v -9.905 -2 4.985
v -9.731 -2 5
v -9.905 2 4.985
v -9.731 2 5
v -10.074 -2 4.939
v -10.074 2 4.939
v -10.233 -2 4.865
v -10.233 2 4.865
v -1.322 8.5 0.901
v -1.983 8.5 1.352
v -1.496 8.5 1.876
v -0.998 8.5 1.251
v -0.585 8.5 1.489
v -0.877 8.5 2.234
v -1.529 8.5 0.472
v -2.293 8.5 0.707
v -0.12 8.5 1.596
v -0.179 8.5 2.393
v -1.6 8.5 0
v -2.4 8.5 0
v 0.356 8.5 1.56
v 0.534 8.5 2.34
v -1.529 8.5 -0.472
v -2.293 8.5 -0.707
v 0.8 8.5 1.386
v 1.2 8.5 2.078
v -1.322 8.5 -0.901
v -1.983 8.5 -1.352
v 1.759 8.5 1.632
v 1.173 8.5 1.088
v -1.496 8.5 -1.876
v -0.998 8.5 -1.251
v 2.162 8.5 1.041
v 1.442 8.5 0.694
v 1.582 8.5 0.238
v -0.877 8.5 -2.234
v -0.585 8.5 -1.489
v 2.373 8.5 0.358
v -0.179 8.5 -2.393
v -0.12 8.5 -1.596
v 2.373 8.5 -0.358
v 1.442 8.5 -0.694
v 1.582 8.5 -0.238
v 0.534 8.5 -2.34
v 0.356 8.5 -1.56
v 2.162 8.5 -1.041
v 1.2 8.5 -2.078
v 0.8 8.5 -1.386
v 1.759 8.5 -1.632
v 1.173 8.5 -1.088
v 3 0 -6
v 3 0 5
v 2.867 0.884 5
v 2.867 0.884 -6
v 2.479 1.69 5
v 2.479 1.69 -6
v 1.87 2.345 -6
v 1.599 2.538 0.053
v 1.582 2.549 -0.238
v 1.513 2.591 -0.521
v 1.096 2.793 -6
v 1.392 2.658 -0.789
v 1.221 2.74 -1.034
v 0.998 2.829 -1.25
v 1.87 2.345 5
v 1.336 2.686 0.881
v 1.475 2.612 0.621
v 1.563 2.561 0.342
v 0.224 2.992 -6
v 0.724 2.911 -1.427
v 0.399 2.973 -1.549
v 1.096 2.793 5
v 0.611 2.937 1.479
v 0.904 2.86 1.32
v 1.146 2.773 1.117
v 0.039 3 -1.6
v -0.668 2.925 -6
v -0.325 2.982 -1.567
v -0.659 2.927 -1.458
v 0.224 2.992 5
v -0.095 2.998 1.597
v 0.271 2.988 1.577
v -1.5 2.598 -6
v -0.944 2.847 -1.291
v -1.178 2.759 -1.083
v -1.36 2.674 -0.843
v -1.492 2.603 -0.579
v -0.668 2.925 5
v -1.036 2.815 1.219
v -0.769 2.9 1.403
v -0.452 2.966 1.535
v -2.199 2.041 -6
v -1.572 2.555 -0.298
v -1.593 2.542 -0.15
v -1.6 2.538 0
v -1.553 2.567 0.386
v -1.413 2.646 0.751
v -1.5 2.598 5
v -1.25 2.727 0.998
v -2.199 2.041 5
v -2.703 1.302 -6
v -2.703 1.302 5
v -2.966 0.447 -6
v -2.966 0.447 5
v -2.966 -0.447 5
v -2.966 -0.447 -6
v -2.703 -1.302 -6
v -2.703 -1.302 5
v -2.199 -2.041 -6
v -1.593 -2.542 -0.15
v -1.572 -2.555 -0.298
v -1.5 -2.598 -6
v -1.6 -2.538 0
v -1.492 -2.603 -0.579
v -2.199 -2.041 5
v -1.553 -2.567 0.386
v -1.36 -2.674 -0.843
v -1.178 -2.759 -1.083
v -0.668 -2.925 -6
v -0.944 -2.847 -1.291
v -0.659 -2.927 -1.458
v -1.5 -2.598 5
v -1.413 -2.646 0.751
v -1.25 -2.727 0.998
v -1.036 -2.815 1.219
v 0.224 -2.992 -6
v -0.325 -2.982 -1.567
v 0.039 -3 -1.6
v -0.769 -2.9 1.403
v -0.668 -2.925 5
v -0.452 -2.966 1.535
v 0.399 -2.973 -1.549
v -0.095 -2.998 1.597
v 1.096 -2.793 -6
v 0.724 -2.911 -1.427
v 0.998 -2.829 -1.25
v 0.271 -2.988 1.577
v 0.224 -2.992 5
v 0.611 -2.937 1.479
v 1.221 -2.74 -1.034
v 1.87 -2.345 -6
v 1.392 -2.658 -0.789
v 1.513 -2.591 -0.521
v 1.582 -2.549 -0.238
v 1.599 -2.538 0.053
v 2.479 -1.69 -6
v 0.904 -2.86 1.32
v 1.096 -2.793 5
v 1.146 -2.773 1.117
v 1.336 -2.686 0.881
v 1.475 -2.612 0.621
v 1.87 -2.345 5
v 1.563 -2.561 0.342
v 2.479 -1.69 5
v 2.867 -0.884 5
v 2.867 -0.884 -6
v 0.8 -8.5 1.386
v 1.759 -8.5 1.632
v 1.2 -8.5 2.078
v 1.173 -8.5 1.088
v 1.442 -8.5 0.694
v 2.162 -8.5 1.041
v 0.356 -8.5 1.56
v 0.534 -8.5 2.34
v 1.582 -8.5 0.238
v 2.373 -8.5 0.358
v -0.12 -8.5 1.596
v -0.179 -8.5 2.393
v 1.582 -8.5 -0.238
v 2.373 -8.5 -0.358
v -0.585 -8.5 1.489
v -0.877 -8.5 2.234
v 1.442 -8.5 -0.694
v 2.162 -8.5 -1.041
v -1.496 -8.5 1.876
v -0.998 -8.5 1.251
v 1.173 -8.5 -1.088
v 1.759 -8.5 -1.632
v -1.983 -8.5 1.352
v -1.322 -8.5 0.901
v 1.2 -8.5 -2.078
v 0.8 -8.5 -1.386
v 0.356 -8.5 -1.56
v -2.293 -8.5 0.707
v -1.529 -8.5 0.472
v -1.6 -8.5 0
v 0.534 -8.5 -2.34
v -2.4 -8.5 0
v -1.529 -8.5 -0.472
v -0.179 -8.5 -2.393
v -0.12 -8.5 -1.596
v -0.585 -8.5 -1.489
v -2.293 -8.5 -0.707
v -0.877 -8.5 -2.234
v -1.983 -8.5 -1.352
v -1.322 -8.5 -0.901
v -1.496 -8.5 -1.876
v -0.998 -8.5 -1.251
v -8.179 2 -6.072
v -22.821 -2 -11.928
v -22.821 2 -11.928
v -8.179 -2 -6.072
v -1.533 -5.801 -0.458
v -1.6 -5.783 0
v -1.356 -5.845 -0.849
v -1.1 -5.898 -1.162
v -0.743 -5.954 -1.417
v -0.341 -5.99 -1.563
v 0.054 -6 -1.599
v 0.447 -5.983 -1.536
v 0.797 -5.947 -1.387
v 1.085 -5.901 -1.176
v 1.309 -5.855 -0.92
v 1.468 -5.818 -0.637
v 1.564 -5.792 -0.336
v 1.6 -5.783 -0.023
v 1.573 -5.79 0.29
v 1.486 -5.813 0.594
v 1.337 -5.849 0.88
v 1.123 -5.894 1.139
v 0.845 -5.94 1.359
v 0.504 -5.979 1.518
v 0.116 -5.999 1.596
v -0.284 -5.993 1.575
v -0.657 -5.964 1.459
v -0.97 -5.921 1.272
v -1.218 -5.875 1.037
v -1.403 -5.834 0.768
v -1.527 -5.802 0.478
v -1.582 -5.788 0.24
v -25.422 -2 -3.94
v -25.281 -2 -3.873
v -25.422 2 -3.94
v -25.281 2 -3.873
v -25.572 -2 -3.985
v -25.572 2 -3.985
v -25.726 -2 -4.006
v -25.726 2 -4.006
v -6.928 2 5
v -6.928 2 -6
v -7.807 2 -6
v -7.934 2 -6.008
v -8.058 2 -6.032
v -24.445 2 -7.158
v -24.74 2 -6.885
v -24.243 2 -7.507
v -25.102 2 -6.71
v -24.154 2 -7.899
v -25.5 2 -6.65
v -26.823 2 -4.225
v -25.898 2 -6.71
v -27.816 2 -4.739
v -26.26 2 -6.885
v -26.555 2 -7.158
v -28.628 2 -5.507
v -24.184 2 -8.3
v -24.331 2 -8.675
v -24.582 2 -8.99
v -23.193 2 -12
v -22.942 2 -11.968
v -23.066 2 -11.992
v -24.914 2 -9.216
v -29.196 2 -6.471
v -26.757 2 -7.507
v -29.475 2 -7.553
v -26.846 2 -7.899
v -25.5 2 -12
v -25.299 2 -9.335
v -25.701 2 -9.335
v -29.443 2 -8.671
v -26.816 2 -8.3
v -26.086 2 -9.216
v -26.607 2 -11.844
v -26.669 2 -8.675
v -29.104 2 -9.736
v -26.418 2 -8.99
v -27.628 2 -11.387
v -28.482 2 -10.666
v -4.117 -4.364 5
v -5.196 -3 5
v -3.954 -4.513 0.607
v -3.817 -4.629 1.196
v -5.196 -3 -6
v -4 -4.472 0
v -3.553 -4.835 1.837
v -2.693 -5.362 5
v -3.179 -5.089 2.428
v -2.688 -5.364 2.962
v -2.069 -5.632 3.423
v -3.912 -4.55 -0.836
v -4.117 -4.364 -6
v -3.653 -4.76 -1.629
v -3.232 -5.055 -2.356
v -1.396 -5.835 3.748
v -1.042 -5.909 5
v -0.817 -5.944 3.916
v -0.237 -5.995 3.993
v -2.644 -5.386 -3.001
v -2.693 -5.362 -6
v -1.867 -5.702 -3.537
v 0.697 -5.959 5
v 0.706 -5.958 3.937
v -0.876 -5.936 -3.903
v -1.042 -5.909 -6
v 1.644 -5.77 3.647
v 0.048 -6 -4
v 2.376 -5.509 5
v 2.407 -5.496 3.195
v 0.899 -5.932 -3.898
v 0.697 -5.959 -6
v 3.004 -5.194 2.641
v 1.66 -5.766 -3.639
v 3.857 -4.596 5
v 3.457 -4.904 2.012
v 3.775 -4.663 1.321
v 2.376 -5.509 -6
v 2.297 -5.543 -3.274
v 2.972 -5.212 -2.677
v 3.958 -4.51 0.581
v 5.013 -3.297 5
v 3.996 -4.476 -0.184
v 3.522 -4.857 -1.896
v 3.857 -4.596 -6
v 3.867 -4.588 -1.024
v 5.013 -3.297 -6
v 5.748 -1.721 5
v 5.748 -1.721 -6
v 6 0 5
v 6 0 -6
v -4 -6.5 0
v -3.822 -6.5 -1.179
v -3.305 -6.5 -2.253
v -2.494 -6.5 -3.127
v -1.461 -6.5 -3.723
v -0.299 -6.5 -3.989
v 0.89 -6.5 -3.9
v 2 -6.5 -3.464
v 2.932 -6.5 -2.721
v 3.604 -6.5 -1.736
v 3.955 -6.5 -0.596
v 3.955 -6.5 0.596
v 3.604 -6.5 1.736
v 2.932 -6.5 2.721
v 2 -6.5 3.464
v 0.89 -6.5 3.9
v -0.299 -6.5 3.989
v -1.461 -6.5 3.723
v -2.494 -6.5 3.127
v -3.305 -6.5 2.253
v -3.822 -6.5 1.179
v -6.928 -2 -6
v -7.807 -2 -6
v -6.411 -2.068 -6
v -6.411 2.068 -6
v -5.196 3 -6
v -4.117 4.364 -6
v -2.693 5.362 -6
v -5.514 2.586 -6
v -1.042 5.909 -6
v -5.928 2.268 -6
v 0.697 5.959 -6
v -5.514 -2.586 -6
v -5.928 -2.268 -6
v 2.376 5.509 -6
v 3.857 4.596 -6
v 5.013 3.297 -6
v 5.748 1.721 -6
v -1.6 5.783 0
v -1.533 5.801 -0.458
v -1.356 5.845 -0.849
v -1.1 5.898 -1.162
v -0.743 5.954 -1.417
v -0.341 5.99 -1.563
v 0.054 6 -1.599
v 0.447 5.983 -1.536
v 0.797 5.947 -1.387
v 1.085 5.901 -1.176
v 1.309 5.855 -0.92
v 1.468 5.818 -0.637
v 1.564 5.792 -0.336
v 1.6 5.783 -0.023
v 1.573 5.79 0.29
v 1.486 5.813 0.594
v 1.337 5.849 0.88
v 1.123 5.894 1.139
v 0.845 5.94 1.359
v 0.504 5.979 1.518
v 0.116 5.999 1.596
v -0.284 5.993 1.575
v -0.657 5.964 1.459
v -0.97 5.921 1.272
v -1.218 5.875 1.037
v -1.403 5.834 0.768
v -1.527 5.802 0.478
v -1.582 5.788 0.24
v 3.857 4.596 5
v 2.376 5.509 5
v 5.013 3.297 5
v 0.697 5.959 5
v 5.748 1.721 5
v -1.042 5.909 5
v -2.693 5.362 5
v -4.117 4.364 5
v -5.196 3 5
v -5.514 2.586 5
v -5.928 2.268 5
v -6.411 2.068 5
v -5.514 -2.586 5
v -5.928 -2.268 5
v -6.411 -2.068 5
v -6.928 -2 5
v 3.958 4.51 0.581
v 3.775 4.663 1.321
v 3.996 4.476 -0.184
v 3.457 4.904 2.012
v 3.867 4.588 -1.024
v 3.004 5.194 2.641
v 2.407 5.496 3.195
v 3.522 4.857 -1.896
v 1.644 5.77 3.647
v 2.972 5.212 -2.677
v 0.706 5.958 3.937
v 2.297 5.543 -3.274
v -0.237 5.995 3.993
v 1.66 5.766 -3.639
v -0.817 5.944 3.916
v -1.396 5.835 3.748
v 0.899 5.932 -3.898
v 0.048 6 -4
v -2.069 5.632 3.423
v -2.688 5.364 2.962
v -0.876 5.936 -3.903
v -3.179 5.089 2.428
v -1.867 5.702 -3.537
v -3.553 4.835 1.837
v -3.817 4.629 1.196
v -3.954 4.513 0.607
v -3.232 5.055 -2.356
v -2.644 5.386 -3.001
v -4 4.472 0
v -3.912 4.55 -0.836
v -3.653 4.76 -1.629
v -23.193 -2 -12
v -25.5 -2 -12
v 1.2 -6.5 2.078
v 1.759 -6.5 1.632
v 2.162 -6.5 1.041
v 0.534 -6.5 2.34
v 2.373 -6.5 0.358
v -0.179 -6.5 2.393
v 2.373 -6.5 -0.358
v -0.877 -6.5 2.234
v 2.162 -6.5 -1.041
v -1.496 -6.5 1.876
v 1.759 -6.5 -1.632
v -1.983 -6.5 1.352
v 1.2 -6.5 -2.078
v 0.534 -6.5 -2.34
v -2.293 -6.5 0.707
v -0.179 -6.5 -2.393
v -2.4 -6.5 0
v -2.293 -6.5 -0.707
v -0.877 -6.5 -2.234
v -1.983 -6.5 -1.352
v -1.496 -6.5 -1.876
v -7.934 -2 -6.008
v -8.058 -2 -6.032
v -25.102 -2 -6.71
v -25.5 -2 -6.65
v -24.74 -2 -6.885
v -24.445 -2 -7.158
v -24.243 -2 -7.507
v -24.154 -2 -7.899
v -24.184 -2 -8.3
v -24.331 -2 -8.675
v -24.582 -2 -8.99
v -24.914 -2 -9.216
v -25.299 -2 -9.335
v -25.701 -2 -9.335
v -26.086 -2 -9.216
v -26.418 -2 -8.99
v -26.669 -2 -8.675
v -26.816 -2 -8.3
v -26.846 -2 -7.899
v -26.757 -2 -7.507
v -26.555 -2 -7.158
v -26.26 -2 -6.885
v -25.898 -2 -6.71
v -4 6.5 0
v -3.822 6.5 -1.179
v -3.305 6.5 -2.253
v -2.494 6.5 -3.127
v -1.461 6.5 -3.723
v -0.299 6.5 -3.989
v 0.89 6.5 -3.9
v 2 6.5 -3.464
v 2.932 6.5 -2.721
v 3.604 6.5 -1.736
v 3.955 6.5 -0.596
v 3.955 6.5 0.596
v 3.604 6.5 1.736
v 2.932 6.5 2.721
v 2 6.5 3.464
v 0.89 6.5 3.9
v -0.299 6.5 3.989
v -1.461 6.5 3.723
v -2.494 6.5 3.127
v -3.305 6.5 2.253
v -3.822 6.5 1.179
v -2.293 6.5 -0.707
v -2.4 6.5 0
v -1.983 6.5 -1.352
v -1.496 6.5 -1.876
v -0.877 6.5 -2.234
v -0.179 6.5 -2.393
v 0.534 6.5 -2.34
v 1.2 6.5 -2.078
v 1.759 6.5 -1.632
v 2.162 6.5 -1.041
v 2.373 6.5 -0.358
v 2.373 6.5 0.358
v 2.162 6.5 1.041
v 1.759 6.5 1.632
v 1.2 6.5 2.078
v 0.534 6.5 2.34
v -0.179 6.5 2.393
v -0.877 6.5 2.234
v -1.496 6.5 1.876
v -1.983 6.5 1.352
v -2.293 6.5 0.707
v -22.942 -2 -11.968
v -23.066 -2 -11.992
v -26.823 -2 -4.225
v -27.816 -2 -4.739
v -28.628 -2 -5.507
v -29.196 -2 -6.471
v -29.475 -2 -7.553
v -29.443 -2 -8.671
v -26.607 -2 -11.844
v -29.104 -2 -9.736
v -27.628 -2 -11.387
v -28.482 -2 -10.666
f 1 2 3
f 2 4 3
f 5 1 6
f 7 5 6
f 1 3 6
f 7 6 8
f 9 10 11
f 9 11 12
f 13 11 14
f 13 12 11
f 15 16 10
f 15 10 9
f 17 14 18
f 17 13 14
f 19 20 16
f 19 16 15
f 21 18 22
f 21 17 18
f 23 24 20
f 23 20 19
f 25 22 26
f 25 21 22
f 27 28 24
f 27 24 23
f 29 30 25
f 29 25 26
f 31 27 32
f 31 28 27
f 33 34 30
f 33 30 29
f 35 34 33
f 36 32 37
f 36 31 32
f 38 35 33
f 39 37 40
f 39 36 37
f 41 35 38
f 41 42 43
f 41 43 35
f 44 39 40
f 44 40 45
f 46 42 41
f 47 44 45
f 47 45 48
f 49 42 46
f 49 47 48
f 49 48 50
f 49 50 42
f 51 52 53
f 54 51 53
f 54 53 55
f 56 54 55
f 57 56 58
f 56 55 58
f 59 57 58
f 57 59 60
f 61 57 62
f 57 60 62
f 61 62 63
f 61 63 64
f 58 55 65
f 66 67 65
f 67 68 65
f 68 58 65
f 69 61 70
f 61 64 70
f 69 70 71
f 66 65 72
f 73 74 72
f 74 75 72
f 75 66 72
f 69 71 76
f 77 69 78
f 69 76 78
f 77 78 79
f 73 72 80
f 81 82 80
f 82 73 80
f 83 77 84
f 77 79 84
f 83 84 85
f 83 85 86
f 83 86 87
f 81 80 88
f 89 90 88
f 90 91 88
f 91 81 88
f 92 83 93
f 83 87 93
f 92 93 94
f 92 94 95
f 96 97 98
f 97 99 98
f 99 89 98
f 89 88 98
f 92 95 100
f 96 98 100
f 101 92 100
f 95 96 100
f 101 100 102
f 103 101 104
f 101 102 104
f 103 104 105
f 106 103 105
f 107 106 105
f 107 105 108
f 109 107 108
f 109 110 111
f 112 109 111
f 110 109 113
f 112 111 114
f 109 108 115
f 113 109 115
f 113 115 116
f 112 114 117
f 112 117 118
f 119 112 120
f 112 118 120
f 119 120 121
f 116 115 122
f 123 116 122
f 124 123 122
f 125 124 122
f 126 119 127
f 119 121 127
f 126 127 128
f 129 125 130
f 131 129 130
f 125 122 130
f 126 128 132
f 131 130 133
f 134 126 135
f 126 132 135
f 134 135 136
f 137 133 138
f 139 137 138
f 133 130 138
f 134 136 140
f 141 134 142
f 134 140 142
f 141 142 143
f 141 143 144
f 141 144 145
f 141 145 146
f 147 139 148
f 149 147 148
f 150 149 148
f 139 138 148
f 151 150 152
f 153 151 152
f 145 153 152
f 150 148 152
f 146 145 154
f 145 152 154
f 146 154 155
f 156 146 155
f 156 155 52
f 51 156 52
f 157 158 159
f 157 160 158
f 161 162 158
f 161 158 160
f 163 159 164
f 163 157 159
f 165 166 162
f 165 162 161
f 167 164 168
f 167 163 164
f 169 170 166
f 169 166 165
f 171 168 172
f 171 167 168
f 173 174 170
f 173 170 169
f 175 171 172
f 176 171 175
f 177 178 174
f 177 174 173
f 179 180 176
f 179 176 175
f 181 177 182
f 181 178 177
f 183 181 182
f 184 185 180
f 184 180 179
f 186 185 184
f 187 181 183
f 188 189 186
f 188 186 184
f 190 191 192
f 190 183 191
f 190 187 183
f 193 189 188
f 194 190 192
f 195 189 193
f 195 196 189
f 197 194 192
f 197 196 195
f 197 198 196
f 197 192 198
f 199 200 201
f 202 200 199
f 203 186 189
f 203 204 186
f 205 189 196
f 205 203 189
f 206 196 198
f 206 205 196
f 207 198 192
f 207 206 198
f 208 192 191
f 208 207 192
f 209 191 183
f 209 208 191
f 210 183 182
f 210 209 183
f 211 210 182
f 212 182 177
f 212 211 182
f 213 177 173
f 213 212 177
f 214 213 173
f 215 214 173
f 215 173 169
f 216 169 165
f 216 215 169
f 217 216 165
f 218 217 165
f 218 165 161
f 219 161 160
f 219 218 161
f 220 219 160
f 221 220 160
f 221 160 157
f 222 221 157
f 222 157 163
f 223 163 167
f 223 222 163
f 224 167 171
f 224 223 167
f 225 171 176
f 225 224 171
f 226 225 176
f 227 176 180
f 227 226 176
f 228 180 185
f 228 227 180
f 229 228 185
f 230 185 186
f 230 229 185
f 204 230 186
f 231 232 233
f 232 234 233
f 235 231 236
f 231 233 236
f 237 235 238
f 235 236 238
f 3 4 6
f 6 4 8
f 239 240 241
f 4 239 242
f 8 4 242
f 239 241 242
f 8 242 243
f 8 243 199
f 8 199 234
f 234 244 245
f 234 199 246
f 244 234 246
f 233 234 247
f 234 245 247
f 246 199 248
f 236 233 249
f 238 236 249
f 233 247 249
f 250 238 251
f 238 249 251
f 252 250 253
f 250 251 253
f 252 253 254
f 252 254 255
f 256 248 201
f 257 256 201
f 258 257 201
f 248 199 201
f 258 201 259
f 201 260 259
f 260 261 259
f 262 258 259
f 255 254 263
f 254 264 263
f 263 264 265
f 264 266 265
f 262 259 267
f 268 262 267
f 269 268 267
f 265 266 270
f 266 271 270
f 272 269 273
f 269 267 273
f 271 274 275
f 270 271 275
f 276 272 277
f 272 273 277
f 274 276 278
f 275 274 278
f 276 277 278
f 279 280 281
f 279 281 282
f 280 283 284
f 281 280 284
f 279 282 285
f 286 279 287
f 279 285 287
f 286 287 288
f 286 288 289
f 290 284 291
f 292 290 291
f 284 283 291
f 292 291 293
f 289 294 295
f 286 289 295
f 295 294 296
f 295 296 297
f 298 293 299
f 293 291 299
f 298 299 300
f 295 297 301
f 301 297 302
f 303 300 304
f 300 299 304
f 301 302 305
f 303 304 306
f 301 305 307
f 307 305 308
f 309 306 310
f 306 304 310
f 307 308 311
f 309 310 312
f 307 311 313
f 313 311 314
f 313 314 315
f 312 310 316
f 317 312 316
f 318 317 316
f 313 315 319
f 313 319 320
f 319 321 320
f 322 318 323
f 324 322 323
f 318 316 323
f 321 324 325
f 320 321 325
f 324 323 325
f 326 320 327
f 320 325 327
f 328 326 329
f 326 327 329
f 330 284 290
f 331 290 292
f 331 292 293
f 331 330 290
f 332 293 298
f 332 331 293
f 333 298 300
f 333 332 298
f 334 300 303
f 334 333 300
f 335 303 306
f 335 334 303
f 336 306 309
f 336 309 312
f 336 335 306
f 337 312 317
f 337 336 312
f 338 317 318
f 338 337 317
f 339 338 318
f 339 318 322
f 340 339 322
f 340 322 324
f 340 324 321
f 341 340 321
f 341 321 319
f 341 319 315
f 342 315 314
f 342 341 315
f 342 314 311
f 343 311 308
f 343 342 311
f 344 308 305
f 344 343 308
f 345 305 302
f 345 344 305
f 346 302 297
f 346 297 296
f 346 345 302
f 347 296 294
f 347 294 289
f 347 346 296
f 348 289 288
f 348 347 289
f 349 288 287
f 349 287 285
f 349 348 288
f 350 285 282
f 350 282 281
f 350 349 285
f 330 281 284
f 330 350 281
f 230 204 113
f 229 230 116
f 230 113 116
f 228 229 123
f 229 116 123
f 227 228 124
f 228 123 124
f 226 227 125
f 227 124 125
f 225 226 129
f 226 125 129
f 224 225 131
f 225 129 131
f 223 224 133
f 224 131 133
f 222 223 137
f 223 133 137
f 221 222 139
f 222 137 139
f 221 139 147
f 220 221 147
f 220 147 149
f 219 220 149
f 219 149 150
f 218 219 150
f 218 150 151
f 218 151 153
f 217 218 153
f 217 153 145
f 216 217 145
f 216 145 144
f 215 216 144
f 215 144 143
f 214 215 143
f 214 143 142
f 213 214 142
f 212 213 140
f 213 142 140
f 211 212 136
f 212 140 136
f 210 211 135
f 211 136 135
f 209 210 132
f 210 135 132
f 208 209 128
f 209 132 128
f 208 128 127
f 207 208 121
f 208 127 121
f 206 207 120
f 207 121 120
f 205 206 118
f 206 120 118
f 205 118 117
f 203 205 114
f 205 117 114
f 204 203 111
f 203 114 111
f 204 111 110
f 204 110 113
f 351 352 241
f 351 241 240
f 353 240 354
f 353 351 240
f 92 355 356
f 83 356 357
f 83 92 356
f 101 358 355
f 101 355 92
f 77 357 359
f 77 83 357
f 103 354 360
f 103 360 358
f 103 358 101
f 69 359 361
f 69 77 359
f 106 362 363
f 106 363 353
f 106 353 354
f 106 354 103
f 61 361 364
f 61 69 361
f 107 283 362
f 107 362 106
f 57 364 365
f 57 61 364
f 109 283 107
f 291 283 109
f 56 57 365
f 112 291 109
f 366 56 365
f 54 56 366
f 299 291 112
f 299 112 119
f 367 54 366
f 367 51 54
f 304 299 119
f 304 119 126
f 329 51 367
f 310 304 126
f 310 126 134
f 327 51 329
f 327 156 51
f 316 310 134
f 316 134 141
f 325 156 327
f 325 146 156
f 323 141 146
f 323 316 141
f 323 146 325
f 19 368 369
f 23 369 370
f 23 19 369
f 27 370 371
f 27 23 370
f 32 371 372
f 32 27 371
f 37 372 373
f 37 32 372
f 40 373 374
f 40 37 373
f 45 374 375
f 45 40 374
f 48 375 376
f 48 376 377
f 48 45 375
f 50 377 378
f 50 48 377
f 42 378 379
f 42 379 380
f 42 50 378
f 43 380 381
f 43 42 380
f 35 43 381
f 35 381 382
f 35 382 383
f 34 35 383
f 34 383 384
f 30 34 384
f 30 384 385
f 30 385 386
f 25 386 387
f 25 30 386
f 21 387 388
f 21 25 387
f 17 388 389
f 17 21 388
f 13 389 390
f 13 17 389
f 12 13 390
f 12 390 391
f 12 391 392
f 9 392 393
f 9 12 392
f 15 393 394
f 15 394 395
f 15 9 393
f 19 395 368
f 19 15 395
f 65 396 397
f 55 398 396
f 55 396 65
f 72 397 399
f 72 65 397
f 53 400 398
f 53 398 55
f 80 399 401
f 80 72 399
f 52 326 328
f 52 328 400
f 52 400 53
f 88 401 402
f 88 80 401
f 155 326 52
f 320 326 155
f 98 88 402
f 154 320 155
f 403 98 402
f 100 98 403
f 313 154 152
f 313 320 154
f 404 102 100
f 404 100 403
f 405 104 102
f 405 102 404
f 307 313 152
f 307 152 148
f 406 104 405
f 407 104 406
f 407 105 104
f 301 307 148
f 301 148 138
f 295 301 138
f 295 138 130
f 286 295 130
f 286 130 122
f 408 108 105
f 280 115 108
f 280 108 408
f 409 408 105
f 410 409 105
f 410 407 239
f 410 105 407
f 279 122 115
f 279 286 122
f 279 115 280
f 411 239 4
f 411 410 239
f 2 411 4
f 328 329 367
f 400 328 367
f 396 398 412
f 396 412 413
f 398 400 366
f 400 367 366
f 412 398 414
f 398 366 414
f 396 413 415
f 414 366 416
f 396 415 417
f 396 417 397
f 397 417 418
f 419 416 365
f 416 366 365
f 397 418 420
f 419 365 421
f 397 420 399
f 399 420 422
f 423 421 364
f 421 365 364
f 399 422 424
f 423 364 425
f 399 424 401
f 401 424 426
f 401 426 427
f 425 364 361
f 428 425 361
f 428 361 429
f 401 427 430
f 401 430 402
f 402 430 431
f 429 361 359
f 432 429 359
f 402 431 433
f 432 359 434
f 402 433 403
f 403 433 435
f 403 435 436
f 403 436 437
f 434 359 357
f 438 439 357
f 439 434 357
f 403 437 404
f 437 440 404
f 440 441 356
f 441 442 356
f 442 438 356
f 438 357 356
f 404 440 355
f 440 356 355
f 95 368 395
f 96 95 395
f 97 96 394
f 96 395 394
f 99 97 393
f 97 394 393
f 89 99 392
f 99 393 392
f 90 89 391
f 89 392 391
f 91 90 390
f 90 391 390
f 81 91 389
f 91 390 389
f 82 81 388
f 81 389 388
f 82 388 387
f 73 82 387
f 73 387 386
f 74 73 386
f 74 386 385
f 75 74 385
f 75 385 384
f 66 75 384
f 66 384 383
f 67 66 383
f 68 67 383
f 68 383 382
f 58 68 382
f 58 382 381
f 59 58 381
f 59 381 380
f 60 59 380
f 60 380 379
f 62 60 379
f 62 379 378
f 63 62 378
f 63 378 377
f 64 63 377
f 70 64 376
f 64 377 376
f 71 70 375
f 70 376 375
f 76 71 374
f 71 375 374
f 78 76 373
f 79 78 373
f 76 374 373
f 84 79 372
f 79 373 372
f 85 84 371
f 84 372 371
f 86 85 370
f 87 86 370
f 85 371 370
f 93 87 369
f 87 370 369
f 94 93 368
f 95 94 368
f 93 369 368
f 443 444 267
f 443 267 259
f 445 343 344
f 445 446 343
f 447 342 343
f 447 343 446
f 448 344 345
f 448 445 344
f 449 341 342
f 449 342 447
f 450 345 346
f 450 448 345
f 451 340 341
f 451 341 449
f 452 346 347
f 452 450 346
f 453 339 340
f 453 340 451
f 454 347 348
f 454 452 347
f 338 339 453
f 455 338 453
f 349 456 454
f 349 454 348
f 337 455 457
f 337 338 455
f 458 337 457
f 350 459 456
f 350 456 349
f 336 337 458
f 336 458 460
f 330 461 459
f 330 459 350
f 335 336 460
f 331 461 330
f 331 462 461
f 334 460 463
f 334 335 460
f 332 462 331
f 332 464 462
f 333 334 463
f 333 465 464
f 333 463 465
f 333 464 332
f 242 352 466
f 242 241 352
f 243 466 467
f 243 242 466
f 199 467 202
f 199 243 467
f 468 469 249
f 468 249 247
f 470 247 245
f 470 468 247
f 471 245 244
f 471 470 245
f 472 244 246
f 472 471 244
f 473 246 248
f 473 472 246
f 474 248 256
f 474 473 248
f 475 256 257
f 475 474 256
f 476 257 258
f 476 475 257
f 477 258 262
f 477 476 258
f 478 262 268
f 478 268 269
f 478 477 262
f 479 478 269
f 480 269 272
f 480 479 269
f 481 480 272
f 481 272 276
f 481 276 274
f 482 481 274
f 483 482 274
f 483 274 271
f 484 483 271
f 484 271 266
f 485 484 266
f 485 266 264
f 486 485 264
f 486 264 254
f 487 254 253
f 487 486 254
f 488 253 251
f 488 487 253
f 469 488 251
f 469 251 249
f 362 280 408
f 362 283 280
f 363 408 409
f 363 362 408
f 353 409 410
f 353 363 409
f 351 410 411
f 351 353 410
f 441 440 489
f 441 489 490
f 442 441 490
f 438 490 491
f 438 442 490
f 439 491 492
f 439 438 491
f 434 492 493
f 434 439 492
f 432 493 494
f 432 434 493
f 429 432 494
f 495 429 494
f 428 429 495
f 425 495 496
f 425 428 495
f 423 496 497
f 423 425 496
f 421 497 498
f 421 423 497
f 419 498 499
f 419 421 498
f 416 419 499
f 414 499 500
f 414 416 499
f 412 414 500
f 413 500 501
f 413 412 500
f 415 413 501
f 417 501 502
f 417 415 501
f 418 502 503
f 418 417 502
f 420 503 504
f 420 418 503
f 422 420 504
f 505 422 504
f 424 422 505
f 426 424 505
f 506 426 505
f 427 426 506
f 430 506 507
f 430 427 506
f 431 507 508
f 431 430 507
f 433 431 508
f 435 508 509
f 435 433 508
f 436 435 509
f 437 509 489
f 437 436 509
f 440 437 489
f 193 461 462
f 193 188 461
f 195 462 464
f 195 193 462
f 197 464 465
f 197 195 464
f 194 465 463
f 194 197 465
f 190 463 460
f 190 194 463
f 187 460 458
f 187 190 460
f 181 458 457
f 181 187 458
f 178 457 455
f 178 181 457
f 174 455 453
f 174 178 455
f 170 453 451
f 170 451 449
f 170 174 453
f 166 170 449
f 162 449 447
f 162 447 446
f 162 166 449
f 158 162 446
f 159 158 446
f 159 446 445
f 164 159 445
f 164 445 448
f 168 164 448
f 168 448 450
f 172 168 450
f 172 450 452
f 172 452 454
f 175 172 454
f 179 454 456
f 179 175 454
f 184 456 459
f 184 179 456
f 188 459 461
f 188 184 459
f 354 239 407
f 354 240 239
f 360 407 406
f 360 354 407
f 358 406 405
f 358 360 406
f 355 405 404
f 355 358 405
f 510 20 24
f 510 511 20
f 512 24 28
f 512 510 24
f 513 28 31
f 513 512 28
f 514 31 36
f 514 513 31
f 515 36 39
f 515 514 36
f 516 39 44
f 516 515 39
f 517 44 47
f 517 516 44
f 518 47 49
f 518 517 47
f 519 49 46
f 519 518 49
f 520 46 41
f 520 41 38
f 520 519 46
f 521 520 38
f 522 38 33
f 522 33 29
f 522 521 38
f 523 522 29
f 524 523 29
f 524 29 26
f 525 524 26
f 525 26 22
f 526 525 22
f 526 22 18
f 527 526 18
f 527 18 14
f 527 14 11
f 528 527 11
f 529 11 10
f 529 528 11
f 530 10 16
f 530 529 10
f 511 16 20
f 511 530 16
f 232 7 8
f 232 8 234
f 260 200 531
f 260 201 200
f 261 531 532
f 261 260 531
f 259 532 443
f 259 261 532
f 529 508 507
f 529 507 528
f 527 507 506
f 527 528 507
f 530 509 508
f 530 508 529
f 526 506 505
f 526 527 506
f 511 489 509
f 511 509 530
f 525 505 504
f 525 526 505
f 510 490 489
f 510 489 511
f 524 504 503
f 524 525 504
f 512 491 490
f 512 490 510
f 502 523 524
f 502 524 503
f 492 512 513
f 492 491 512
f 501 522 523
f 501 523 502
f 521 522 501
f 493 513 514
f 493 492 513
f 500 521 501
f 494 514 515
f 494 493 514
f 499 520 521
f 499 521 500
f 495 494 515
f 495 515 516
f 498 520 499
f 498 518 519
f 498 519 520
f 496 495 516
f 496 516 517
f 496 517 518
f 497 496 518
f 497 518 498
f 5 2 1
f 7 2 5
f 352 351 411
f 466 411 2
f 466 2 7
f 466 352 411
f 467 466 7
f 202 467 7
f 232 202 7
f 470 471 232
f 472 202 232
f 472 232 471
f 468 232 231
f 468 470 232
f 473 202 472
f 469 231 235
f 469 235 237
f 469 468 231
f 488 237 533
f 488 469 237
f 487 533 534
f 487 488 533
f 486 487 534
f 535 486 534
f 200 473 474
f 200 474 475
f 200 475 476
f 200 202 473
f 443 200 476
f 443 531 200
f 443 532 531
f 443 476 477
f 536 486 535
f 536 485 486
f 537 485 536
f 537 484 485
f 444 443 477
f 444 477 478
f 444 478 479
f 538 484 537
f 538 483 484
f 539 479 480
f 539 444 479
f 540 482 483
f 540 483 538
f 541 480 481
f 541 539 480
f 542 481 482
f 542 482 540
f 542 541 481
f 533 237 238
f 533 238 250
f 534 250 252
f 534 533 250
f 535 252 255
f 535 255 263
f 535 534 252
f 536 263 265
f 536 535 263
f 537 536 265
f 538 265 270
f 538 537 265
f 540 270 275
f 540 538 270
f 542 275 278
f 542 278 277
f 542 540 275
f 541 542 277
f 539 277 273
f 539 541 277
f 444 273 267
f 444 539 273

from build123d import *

# Parameters (mm, degrees)
BOSS_EXTRUDE1_DEPTH            = 5
BOSS_EXTRUDE1_DEPTH_BACK       = 6
SKETCH2_R                      = 6
CUT_EXTRUDE1_REACH             = 14.01
SKETCH3_R                      = 3
CUT_EXTRUDE1_DIRECTION_2_REACH = 14.01
SKETCH4_R                      = 1.6
CUT_EXTRUDE4_DEPTH             = 17
BOSS_EXTRUDE2_DEPTH            = 2
BOSS_EXTRUDE2_DEPTH_BACK       = 2
SKETCH5_R                      = 1.35
FILLET1_R                      = 2
FILLET2_R                      = 1


with BuildPart() as part:
    # Sketch1 → Revolve1 (revolve)
    with BuildSketch(Plane.XY, mode=Mode.PRIVATE) as revolve1_sk:
        Polygon((1.6, -8.5), (1.6, 8.5), (2.4, 8.5), (2.4, 6.5), (4, 6.5), (4, -6.5), (2.4, -6.5), (2.4, -8.5), align=None)
    revolve(revolve1_sk.sketch.rotate(Axis((0, 9.772747413, 0), (0, -1, 0)), 180), axis=Axis((0, 9.772747413, 0), (0, -1, 0)))

    # Sketch2 → Boss-Extrude1 (add, two sides: drawn at the far end of the back side and taken through both)
    with BuildSketch(Plane.XY.offset(-BOSS_EXTRUDE1_DEPTH_BACK)):
        Circle(SKETCH2_R)
    extrude(amount=BOSS_EXTRUDE1_DEPTH + BOSS_EXTRUDE1_DEPTH_BACK)

    # Sketch3 → Cut-Extrude1 (cut, up to next)
    with BuildSketch(Plane.XY, mode=Mode.PRIVATE) as cut_extrude1_sk1:
        Circle(SKETCH3_R)
    cut_extrude1_tool1 = extrude(cut_extrude1_sk1.sketch, amount=-CUT_EXTRUDE1_REACH, mode=Mode.PRIVATE) & part.part
    add(cut_extrude1_tool1.solids().sort_by_distance((0, 0, 0))[0], mode=Mode.SUBTRACT)

    # Sketch3 → Cut-Extrude1 direction 2 (cut, up to next)
    with BuildSketch(Plane.XY, mode=Mode.PRIVATE) as cut_extrude1_direction_2_sk1:
        Circle(SKETCH3_R)
    cut_extrude1_direction_2_tool1 = extrude(cut_extrude1_direction_2_sk1.sketch, amount=CUT_EXTRUDE1_DIRECTION_2_REACH, mode=Mode.PRIVATE) & part.part
    add(cut_extrude1_direction_2_tool1.solids().sort_by_distance((0, 0, 0))[0], mode=Mode.SUBTRACT)

    # Sketch4 → Cut-Extrude4 (cut)
    with BuildSketch(Plane(origin=(0, 8.5, 0), x_dir=(1, 0, 0), z_dir=(0, 1, 0))):
        with Locations(Location((0, 0, 0), (0, 0, 180))):
            Circle(SKETCH4_R)
    extrude(amount=-CUT_EXTRUDE4_DEPTH, mode=Mode.SUBTRACT)

    # Sketch5 → Boss-Extrude2 (add, two sides: drawn at the far end of the back side and taken through both)
    with BuildSketch(Plane(origin=(0, 0, 0), x_dir=(1, 0, 0), z_dir=(0, 1, 0)).offset(-BOSS_EXTRUDE2_DEPTH_BACK)):
        with BuildLine():
            Line((-6, -5), (-10, -5))
            Line((-10, -5), (-25.5, 4))
            ThreePointArc((-25.5, 4), (-29.5, 8), (-25.5, 12))
            Line((-25.5, 12), (-23, 12))
            Line((-23, 12), (-8, 6))
            Line((-8, 6), (-6, 6))
            Line((-6, 6), (-3, 6))
            Line((-3, 6), (-3, -5))
            Line((-3, -5), (-6, -5))
        make_face()
        with Locations(Location((-25.5, 8, 0), (0, 0, 270))):
            Circle(SKETCH5_R, mode=Mode.SUBTRACT)
    extrude(amount=BOSS_EXTRUDE2_DEPTH + BOSS_EXTRUDE2_DEPTH_BACK)

    # Fillet1
    fillet1_edges = [part.edges().sort_by_distance(p)[0] for p in [
        (-5.656854249, 2, -0.5),
        (-5.656854249, -2, -0.5),
    ]]
    fillet(fillet1_edges, radius=FILLET1_R)

    # Fillet2
    fillet2_edges = [part.edges().sort_by_distance(p)[0] for p in [
        (-10, 0, 5),
        (-25.5, 0, -4),
        (-23, 0, -12),
        (-8, 0, -6),
    ]]
    fillet(fillet2_edges, radius=FILLET2_R)


solid = part.part
